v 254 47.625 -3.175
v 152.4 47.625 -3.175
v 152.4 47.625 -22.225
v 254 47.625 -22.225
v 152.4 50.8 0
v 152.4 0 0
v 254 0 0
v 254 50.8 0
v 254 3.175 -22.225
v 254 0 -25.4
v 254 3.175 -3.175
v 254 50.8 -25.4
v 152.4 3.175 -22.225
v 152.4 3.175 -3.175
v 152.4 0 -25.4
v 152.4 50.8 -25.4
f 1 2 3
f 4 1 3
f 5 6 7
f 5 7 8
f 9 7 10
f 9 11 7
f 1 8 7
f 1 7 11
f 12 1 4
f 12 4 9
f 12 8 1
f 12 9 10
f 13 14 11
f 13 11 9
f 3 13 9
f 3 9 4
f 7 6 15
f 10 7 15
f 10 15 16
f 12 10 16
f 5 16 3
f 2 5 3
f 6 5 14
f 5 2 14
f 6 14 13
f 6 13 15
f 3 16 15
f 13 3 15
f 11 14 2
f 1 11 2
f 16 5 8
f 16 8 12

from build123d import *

# Parameters (mm, degrees)
SKETCH1_W           = 25.4
SKETCH1_H           = 50.8
SKETCH1_W_2         = 19.05
SKETCH1_H_2         = 44.45
BOSS_EXTRUDE1_DEPTH = 254
CUT_EXTRUDE1_DEPTH  = 149.098


with BuildPart() as part:
    # Sketch1 → Boss-Extrude1 (new body)
    with BuildSketch(Plane(origin=(0, 0, 0), x_dir=(0, 0, -1), z_dir=(1, 0, 0))):
        with Locations((12.7, 25.4)):
            Rectangle(SKETCH1_W, SKETCH1_H)
        with Locations((12.7, 25.4)):
            Rectangle(SKETCH1_W_2, SKETCH1_H_2, mode=Mode.SUBTRACT)
    extrude(amount=BOSS_EXTRUDE1_DEPTH)

    # Sketch2 → Cut-Extrude1 (cut)
    with BuildSketch(Plane(origin=(0, 0, -25.4), x_dir=(-1, 0, 0), z_dir=(0, 0, -1))):
        Polygon((-152.4, 23.345366578), (-152.4, 0), (0, 0), (0, 50.8), (-152.4, 50.8), align=None)
    extrude(amount=-CUT_EXTRUDE1_DEPTH, mode=Mode.SUBTRACT)


solid = part.part
